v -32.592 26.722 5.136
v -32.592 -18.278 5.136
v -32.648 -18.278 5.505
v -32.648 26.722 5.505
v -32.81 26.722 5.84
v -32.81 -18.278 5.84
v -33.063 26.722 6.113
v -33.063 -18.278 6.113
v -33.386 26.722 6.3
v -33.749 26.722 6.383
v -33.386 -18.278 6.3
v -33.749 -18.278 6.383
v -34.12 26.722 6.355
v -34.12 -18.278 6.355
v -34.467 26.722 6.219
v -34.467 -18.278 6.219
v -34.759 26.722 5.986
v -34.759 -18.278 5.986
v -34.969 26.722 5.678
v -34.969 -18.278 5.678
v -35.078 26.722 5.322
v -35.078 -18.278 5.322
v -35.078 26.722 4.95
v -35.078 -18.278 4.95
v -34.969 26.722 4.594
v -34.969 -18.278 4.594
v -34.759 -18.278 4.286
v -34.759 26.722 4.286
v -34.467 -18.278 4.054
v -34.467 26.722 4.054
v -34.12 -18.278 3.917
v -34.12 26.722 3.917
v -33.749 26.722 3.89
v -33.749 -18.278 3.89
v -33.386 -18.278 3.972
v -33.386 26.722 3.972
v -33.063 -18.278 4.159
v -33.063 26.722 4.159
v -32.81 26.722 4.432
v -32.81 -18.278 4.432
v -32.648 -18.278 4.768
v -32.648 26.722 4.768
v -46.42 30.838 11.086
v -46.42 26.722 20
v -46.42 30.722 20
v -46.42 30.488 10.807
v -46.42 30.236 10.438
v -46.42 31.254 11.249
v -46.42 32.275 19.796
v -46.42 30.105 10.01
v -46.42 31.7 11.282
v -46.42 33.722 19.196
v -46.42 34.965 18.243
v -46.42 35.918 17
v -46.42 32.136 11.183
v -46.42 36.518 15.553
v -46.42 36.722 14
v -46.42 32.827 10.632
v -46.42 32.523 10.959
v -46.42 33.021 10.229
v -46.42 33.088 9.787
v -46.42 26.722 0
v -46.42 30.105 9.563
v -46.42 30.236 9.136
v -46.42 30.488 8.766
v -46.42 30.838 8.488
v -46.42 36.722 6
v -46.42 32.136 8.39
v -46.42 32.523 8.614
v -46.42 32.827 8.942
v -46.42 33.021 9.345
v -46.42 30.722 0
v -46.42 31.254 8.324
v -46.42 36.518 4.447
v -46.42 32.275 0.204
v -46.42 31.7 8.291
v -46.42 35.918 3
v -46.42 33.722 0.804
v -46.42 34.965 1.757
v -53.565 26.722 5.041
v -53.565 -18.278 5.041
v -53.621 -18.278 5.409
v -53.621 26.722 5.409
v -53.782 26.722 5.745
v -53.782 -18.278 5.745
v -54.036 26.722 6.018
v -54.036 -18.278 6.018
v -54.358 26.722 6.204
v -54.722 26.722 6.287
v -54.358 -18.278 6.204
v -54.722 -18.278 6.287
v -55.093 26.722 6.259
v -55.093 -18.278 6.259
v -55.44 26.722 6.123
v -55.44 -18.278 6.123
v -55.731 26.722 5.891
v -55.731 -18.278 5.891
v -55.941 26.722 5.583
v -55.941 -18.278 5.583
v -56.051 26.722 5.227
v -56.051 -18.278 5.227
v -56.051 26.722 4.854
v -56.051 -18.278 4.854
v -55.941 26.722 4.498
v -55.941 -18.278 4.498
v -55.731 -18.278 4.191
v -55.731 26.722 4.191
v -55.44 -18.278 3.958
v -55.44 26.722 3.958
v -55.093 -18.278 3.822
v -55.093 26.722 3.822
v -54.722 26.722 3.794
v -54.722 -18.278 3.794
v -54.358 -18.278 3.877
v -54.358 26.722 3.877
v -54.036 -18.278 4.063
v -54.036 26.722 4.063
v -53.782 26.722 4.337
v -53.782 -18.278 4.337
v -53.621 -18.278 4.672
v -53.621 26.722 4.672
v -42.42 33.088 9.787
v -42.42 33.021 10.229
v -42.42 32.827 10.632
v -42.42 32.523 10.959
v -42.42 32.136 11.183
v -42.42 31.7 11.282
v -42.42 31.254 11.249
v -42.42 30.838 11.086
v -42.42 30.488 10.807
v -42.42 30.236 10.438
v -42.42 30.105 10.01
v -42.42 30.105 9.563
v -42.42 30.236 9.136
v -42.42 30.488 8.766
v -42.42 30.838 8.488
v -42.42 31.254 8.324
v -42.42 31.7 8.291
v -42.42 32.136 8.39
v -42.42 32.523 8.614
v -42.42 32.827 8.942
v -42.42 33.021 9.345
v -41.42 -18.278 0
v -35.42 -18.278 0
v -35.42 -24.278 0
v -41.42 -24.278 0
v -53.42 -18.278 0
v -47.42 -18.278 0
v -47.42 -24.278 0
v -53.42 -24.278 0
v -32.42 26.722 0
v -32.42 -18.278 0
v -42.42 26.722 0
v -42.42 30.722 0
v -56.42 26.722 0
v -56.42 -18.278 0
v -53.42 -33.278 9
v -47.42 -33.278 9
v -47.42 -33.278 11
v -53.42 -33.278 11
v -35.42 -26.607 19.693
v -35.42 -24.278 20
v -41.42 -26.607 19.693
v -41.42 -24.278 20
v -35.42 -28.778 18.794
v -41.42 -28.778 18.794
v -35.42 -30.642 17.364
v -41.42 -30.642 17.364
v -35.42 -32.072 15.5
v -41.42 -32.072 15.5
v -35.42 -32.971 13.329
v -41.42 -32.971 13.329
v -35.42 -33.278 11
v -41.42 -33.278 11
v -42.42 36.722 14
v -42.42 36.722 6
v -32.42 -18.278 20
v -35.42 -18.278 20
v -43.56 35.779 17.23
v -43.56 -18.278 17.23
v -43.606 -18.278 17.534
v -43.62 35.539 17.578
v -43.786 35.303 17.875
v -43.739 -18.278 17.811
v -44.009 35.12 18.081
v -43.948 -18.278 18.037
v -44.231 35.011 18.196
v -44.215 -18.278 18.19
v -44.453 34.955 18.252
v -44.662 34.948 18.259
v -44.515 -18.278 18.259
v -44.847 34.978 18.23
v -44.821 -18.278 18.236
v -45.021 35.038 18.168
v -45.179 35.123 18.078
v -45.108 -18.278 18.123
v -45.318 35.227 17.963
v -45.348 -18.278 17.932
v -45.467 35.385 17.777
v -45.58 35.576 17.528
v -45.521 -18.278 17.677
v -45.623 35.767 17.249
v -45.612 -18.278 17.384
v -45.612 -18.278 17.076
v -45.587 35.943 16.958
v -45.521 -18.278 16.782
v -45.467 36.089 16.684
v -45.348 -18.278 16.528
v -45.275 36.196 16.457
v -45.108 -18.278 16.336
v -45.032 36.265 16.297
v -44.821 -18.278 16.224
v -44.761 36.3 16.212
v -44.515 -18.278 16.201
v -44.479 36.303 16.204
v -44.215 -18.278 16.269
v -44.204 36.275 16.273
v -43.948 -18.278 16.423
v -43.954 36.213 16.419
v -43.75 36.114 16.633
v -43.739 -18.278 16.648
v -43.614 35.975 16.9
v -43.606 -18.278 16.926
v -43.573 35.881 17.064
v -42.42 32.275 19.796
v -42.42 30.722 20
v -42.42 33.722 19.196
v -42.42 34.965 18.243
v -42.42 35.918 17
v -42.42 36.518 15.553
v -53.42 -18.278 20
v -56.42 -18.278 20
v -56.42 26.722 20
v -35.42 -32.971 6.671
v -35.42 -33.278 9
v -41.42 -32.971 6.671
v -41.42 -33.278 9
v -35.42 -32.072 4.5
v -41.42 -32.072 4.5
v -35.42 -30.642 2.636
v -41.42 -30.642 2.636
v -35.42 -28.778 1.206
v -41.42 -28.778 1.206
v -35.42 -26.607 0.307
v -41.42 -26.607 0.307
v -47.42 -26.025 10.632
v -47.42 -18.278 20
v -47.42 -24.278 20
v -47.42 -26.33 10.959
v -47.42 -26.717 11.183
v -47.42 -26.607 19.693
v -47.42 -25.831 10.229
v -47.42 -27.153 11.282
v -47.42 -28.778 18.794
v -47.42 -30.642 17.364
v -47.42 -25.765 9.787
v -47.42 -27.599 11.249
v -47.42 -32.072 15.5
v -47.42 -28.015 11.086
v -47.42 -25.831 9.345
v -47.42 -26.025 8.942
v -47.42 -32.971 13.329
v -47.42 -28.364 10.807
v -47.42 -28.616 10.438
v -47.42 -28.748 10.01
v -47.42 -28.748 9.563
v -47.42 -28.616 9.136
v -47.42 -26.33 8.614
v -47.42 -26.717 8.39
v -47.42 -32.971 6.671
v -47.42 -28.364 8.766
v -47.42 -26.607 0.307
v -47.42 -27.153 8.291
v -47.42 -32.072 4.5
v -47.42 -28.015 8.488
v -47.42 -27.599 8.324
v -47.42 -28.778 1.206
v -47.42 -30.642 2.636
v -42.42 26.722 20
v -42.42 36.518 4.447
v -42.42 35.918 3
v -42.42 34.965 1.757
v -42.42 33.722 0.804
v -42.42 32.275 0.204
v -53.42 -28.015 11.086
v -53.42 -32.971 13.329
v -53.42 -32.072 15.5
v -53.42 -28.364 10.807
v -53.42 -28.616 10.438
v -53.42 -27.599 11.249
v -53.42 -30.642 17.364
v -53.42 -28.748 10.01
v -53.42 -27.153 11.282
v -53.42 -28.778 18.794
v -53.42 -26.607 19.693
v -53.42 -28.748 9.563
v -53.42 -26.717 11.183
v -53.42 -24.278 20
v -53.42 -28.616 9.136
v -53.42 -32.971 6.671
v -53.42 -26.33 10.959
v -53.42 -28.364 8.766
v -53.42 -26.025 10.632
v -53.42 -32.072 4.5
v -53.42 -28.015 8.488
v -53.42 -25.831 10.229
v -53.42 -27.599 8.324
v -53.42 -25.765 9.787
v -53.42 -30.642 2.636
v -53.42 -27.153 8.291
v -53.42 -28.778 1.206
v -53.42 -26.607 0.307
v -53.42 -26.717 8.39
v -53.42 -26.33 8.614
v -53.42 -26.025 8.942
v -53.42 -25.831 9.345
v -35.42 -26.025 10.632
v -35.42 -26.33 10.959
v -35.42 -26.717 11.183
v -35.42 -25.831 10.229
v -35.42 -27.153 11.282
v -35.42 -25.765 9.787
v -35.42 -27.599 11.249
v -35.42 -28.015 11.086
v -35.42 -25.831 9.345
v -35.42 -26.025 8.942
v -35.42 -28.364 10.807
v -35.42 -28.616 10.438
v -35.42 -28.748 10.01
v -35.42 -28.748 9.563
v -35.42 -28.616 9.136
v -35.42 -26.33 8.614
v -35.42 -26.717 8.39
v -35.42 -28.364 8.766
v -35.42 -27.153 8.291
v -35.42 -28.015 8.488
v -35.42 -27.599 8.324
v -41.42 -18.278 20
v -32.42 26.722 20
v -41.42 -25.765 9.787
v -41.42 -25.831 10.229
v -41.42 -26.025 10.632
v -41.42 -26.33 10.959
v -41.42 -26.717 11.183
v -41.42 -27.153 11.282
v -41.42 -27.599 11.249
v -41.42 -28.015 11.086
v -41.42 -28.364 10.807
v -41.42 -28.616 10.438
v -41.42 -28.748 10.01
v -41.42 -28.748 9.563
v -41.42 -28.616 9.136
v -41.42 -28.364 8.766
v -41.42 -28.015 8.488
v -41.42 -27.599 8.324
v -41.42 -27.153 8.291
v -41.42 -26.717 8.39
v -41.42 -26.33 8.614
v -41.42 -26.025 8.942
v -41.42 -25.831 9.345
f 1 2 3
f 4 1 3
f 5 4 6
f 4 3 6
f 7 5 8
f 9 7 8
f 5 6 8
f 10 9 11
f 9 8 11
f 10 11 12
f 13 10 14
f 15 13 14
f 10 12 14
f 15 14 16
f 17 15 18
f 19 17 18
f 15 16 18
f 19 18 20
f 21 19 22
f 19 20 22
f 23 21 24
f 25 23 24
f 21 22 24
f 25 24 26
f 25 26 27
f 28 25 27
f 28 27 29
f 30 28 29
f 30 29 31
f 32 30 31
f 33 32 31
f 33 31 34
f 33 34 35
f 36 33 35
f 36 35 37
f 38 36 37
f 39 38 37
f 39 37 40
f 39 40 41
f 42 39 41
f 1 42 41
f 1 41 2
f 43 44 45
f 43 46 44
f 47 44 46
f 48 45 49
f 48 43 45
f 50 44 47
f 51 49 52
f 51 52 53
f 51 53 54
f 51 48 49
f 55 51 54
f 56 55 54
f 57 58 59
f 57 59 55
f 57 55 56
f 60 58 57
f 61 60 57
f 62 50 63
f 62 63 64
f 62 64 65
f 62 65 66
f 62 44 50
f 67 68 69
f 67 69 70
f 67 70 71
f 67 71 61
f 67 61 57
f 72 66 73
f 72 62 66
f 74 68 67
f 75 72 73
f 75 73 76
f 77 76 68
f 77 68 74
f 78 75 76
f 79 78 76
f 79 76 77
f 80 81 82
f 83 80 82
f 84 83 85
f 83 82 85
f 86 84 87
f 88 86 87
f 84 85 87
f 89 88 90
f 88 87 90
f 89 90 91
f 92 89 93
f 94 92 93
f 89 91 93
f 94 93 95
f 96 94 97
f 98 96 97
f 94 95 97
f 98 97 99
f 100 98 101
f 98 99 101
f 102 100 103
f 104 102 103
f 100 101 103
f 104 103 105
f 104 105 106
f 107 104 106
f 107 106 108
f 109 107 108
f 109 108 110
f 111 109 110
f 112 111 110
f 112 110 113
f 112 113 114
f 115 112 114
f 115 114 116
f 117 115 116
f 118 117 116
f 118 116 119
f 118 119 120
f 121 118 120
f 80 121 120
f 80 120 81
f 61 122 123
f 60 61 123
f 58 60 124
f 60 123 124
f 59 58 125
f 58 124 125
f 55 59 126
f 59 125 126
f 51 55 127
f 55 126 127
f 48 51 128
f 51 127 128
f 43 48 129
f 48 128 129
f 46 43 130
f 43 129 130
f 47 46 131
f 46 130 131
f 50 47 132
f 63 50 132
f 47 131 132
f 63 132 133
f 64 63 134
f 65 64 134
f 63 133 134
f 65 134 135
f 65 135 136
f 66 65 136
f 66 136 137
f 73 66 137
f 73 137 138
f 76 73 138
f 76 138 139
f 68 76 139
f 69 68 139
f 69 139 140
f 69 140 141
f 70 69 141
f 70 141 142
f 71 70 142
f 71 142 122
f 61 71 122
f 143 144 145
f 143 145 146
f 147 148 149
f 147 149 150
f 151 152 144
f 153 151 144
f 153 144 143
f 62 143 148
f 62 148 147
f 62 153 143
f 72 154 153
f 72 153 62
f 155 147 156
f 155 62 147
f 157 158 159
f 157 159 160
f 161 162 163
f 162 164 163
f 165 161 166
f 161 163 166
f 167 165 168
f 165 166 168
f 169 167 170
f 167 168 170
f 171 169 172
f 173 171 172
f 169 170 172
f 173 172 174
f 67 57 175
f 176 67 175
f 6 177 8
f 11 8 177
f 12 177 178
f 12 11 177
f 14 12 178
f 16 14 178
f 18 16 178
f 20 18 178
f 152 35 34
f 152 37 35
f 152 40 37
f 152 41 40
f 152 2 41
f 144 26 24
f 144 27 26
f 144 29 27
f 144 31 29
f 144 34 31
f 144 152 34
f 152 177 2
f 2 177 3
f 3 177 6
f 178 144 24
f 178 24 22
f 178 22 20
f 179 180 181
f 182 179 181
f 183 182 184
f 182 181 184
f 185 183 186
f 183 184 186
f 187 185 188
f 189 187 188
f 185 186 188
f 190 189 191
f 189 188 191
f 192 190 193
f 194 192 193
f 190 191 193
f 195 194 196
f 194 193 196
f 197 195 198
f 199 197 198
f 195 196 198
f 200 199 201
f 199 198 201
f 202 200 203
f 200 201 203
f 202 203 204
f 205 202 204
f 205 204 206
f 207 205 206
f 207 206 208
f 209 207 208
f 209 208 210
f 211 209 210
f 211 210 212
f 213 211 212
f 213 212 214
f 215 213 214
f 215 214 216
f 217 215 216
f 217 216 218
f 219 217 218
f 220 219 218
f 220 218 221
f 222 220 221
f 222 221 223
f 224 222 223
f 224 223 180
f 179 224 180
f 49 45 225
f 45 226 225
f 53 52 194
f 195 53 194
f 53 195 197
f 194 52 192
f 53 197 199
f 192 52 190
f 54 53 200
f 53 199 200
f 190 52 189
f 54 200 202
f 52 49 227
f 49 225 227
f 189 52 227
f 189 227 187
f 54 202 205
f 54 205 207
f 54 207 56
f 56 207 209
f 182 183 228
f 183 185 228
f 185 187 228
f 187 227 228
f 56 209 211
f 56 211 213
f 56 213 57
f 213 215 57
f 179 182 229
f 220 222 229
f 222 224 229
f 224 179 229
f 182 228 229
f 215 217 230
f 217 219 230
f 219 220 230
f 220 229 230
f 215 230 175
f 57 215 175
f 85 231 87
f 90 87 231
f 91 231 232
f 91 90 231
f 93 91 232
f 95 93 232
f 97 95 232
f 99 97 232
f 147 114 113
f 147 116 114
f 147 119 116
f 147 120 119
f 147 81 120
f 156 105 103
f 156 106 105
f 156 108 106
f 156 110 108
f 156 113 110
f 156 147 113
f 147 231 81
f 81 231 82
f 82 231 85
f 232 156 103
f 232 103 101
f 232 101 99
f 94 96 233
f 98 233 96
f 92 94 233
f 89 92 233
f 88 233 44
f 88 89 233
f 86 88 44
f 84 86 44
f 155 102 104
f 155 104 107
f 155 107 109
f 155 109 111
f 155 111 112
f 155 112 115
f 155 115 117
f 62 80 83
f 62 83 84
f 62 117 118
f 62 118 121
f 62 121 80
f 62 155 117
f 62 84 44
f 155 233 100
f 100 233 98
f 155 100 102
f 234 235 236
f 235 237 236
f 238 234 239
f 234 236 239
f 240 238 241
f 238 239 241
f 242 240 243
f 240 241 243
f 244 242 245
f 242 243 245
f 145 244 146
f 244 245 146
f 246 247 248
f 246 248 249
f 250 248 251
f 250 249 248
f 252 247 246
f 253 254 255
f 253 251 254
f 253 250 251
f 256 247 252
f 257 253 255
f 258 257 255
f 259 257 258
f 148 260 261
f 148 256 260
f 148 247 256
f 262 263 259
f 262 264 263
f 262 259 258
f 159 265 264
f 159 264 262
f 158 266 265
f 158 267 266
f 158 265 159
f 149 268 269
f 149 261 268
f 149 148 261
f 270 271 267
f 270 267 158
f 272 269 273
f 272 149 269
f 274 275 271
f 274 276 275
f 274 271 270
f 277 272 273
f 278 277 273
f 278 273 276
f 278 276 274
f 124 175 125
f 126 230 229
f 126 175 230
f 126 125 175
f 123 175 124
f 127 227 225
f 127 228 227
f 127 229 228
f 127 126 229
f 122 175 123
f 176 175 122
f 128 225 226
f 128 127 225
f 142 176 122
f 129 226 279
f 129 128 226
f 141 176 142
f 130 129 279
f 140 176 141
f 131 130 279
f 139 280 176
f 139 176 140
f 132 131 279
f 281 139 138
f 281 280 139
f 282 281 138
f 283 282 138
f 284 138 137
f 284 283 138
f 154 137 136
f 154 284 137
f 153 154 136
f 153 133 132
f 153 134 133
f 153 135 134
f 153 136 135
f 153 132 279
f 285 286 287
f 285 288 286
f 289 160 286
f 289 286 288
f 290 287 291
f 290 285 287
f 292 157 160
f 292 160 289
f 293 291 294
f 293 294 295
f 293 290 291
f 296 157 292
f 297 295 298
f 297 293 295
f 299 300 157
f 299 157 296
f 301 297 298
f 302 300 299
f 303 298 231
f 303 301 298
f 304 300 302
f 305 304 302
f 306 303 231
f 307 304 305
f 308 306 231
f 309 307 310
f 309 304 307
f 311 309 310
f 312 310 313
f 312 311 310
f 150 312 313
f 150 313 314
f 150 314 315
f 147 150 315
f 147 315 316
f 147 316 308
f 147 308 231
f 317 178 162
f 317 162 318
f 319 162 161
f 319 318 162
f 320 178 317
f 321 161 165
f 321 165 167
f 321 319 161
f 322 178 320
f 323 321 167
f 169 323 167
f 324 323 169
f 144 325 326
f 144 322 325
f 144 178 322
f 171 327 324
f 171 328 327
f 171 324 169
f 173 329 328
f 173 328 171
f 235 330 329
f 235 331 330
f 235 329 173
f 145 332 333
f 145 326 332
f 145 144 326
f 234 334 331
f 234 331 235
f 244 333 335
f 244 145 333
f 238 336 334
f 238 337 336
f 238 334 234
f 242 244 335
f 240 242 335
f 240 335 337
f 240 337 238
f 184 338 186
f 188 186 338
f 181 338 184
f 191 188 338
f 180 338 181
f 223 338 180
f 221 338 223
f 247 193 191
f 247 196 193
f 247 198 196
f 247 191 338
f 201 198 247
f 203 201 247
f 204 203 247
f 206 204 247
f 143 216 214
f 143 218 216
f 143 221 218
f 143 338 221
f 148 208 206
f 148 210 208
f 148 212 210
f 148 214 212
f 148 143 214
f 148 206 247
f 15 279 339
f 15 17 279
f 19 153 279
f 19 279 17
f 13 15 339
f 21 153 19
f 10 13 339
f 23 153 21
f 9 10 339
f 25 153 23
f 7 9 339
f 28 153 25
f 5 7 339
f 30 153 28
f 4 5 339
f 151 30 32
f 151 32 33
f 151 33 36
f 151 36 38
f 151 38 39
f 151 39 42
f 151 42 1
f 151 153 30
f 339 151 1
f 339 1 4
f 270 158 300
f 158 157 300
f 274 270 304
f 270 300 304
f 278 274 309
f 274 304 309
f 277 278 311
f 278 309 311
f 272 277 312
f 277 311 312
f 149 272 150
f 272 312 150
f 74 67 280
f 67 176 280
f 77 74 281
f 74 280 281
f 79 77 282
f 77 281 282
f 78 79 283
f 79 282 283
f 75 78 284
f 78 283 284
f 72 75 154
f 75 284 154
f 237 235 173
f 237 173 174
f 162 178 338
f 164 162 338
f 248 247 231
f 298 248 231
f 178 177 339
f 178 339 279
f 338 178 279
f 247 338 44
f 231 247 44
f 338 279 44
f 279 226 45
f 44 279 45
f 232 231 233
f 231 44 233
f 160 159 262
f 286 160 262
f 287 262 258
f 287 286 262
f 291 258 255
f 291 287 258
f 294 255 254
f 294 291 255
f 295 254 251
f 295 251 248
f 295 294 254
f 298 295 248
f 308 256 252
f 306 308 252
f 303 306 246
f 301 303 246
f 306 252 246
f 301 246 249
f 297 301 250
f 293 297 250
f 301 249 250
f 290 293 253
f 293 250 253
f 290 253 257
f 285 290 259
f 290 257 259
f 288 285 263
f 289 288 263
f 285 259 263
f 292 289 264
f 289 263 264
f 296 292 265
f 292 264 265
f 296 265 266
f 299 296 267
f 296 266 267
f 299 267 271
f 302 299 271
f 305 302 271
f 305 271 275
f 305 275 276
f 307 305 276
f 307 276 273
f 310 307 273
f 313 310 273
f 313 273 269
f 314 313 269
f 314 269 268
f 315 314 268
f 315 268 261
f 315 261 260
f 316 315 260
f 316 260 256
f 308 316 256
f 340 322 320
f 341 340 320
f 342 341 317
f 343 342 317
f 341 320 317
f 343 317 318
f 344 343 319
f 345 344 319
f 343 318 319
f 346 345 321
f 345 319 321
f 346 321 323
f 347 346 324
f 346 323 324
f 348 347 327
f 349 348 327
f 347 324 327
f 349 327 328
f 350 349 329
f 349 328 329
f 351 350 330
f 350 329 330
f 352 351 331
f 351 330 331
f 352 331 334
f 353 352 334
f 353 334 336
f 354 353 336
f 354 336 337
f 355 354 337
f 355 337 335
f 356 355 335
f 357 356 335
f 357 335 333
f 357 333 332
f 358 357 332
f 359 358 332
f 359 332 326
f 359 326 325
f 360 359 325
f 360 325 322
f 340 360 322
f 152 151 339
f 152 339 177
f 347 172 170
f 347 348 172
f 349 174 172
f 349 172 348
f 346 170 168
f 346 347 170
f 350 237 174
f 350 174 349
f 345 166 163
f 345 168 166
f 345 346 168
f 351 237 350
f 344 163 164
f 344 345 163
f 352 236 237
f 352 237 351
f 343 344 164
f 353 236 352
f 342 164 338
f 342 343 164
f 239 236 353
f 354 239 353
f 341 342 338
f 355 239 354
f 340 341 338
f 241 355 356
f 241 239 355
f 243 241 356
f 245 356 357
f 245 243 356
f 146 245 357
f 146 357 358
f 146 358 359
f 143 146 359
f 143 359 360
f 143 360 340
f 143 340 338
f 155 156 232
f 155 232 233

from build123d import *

# Parameters (mm, degrees)
PAD_DEPTH       = 20
FILLET_R        = 9
FILLET001_R     = 9
FILLET002_R     = 9
FILLET003_R     = 9
FILLET004_R     = 6
FILLET005_R     = 6
SKETCH002_R     = 1.5
POCKET001_DEPTH = 14.001
SKETCH003_R     = 1.5
POCKET_DEPTH    = 21.001
SKETCH004_R     = 1.25
POCKET002_DEPTH = 55.001
SKETCH005_R     = 1.031889
POCKET003_DEPTH = 55.001


with BuildPart() as part:
    # Sketch → Pad (new body)
    with BuildSketch(Plane.XY):
        Polygon((-56.419573, 26.722219), (-46.419573, 26.722219), (-46.419573, 36.722219), (-42.419573, 36.722219), (-42.419573, 26.722219), (-32.419573, 26.722219), (-32.419573, -18.277781), (-35.419573, -18.277781), (-35.419573, -33.277781), (-41.419573, -33.277781), (-41.419573, -18.277781), (-47.419573, -18.277781), (-47.419573, -33.277781), (-53.419573, -33.277781), (-53.419573, -18.277781), (-56.419573, -18.277781), align=None)
    extrude(amount=PAD_DEPTH)

    # Fillet
    fillet_edges = [part.edges().sort_by_distance(p)[0] for p in [
        (-50.419573, -33.277781, 0),
    ]]
    fillet(fillet_edges, radius=FILLET_R)

    # Fillet001
    fillet001_edges = [part.edges().sort_by_distance(p)[0] for p in [
        (-50.419573, -33.277781, 20),
    ]]
    fillet(fillet001_edges, radius=FILLET001_R)

    # Fillet002
    fillet002_edges = [part.edges().sort_by_distance(p)[0] for p in [
        (-38.419573, -33.277781, 20),
    ]]
    fillet(fillet002_edges, radius=FILLET002_R)

    # Fillet003
    fillet003_edges = [part.edges().sort_by_distance(p)[0] for p in [
        (-38.419573, -33.277781, 0),
    ]]
    fillet(fillet003_edges, radius=FILLET003_R)

    # Fillet004
    fillet004_edges = [part.edges().sort_by_distance(p)[0] for p in [
        (-44.419573, 36.722219, 20),
    ]]
    fillet(fillet004_edges, radius=FILLET004_R)

    # Fillet005
    fillet005_edges = [part.edges().sort_by_distance(p)[0] for p in [
        (-44.419573, 36.722219, 0),
    ]]
    fillet(fillet005_edges, radius=FILLET005_R)

    # Sketch002 → Pocket001 (cut, through all)
    with BuildSketch(Plane.YZ.offset(-42.419573)):
        with Locations((31.587833, 9.786681)):
            Circle(SKETCH002_R)
    extrude(amount=-POCKET001_DEPTH, mode=Mode.SUBTRACT)

    # Sketch003 (on Face14 of Pocket001) → Pocket (cut, through all)
    with BuildSketch(Plane.YZ.offset(-35.419573)):
        with Locations((-27.264815, 9.786693)):
            Circle(SKETCH003_R)
    extrude(amount=-POCKET_DEPTH, mode=Mode.SUBTRACT)

    # Sketch004 (on Face15 of Pocket) → Pocket002 (cut, through all)
    with BuildSketch(Plane.XZ.offset(18.277781)):
        with Locations((-54.815166, 5.040761)):
            Circle(SKETCH004_R)
        with Locations((-33.842335, 5.136092)):
            Circle(SKETCH004_R)
    extrude(amount=-POCKET002_DEPTH, mode=Mode.SUBTRACT)

    # Sketch005 (on Face20 of Pocket002) → Pocket003 (cut, through all)
    with BuildSketch(Plane.XZ.offset(18.277781)):
        with Locations((-44.591709, 17.229778)):
            Circle(SKETCH005_R)
    extrude(amount=-POCKET003_DEPTH, mode=Mode.SUBTRACT)


solid = part.part
